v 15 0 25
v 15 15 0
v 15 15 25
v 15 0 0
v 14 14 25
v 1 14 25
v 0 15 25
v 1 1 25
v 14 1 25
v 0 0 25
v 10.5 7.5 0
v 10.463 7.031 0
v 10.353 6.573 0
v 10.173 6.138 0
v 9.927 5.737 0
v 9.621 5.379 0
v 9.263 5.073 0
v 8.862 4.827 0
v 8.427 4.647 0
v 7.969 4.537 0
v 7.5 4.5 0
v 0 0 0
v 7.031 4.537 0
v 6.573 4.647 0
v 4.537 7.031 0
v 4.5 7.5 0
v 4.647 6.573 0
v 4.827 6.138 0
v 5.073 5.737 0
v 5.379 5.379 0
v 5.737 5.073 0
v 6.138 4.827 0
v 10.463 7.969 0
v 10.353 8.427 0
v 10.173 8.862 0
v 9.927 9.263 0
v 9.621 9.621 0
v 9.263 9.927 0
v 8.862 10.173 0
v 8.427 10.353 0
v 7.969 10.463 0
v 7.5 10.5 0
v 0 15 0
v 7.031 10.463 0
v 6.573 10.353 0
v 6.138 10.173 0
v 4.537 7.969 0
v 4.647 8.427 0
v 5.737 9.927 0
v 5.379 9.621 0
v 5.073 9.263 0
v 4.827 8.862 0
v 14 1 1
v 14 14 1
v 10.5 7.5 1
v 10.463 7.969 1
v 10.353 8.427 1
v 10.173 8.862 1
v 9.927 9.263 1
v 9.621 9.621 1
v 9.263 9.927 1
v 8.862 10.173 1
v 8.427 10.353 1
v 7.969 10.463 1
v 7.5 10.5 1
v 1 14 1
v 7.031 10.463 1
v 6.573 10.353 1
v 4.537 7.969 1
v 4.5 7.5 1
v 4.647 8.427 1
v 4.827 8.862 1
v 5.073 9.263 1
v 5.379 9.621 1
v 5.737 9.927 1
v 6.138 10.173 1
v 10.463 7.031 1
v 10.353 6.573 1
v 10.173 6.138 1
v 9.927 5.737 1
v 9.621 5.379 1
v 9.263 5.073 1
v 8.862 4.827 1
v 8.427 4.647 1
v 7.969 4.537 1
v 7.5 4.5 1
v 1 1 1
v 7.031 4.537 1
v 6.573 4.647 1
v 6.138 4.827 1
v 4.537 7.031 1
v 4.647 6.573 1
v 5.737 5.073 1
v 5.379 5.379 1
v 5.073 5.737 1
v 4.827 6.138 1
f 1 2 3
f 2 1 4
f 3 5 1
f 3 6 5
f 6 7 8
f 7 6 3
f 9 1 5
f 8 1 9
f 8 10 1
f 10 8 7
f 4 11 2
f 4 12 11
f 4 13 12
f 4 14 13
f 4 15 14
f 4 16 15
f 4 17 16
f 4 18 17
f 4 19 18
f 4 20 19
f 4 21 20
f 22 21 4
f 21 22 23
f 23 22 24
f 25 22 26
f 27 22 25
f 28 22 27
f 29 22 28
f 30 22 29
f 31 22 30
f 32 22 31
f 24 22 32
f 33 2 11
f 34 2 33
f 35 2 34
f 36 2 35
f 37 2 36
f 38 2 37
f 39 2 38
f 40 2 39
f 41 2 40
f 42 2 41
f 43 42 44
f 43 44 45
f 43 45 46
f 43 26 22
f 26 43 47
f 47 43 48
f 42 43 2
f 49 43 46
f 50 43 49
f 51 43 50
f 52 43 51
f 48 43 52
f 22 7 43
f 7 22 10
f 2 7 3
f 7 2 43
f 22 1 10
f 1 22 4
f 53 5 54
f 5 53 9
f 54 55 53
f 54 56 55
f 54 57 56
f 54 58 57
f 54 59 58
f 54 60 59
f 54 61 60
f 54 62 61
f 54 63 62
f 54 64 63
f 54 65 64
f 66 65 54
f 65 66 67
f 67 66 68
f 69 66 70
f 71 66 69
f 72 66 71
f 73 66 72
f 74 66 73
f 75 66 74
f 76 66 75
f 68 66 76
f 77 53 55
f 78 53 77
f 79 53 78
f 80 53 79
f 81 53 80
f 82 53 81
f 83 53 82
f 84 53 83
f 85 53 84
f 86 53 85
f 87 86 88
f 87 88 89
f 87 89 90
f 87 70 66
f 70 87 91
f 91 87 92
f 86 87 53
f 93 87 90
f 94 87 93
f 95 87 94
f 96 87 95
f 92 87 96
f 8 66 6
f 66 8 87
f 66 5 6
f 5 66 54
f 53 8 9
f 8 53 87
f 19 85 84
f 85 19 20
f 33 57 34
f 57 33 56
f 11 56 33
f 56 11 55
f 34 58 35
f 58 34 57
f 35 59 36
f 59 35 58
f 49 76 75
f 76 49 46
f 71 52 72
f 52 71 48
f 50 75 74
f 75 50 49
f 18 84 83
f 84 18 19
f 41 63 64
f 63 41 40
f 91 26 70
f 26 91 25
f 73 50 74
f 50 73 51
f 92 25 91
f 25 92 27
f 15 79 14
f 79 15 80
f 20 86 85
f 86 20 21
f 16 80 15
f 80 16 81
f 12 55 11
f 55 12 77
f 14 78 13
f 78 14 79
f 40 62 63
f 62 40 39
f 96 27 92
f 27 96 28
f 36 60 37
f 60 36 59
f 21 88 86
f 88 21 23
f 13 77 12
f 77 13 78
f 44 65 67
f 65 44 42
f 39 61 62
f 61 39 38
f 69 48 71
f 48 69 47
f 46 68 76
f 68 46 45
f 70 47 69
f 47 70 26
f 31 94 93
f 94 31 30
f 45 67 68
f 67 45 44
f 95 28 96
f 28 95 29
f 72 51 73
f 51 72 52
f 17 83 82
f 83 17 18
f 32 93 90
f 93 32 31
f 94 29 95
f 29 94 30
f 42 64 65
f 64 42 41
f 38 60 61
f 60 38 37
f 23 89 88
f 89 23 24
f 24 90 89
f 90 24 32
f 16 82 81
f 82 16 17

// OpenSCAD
difference (){
    color ([1,0,0])
        translate([0,0,0]) 
        cube ([15,15,25]);
    translate([1,1,1]) 
        cube ([13,13,40]);
    translate([7.5,7.5,-1]) 
        cylinder (d=6, $fn = 40, h=50);
}
